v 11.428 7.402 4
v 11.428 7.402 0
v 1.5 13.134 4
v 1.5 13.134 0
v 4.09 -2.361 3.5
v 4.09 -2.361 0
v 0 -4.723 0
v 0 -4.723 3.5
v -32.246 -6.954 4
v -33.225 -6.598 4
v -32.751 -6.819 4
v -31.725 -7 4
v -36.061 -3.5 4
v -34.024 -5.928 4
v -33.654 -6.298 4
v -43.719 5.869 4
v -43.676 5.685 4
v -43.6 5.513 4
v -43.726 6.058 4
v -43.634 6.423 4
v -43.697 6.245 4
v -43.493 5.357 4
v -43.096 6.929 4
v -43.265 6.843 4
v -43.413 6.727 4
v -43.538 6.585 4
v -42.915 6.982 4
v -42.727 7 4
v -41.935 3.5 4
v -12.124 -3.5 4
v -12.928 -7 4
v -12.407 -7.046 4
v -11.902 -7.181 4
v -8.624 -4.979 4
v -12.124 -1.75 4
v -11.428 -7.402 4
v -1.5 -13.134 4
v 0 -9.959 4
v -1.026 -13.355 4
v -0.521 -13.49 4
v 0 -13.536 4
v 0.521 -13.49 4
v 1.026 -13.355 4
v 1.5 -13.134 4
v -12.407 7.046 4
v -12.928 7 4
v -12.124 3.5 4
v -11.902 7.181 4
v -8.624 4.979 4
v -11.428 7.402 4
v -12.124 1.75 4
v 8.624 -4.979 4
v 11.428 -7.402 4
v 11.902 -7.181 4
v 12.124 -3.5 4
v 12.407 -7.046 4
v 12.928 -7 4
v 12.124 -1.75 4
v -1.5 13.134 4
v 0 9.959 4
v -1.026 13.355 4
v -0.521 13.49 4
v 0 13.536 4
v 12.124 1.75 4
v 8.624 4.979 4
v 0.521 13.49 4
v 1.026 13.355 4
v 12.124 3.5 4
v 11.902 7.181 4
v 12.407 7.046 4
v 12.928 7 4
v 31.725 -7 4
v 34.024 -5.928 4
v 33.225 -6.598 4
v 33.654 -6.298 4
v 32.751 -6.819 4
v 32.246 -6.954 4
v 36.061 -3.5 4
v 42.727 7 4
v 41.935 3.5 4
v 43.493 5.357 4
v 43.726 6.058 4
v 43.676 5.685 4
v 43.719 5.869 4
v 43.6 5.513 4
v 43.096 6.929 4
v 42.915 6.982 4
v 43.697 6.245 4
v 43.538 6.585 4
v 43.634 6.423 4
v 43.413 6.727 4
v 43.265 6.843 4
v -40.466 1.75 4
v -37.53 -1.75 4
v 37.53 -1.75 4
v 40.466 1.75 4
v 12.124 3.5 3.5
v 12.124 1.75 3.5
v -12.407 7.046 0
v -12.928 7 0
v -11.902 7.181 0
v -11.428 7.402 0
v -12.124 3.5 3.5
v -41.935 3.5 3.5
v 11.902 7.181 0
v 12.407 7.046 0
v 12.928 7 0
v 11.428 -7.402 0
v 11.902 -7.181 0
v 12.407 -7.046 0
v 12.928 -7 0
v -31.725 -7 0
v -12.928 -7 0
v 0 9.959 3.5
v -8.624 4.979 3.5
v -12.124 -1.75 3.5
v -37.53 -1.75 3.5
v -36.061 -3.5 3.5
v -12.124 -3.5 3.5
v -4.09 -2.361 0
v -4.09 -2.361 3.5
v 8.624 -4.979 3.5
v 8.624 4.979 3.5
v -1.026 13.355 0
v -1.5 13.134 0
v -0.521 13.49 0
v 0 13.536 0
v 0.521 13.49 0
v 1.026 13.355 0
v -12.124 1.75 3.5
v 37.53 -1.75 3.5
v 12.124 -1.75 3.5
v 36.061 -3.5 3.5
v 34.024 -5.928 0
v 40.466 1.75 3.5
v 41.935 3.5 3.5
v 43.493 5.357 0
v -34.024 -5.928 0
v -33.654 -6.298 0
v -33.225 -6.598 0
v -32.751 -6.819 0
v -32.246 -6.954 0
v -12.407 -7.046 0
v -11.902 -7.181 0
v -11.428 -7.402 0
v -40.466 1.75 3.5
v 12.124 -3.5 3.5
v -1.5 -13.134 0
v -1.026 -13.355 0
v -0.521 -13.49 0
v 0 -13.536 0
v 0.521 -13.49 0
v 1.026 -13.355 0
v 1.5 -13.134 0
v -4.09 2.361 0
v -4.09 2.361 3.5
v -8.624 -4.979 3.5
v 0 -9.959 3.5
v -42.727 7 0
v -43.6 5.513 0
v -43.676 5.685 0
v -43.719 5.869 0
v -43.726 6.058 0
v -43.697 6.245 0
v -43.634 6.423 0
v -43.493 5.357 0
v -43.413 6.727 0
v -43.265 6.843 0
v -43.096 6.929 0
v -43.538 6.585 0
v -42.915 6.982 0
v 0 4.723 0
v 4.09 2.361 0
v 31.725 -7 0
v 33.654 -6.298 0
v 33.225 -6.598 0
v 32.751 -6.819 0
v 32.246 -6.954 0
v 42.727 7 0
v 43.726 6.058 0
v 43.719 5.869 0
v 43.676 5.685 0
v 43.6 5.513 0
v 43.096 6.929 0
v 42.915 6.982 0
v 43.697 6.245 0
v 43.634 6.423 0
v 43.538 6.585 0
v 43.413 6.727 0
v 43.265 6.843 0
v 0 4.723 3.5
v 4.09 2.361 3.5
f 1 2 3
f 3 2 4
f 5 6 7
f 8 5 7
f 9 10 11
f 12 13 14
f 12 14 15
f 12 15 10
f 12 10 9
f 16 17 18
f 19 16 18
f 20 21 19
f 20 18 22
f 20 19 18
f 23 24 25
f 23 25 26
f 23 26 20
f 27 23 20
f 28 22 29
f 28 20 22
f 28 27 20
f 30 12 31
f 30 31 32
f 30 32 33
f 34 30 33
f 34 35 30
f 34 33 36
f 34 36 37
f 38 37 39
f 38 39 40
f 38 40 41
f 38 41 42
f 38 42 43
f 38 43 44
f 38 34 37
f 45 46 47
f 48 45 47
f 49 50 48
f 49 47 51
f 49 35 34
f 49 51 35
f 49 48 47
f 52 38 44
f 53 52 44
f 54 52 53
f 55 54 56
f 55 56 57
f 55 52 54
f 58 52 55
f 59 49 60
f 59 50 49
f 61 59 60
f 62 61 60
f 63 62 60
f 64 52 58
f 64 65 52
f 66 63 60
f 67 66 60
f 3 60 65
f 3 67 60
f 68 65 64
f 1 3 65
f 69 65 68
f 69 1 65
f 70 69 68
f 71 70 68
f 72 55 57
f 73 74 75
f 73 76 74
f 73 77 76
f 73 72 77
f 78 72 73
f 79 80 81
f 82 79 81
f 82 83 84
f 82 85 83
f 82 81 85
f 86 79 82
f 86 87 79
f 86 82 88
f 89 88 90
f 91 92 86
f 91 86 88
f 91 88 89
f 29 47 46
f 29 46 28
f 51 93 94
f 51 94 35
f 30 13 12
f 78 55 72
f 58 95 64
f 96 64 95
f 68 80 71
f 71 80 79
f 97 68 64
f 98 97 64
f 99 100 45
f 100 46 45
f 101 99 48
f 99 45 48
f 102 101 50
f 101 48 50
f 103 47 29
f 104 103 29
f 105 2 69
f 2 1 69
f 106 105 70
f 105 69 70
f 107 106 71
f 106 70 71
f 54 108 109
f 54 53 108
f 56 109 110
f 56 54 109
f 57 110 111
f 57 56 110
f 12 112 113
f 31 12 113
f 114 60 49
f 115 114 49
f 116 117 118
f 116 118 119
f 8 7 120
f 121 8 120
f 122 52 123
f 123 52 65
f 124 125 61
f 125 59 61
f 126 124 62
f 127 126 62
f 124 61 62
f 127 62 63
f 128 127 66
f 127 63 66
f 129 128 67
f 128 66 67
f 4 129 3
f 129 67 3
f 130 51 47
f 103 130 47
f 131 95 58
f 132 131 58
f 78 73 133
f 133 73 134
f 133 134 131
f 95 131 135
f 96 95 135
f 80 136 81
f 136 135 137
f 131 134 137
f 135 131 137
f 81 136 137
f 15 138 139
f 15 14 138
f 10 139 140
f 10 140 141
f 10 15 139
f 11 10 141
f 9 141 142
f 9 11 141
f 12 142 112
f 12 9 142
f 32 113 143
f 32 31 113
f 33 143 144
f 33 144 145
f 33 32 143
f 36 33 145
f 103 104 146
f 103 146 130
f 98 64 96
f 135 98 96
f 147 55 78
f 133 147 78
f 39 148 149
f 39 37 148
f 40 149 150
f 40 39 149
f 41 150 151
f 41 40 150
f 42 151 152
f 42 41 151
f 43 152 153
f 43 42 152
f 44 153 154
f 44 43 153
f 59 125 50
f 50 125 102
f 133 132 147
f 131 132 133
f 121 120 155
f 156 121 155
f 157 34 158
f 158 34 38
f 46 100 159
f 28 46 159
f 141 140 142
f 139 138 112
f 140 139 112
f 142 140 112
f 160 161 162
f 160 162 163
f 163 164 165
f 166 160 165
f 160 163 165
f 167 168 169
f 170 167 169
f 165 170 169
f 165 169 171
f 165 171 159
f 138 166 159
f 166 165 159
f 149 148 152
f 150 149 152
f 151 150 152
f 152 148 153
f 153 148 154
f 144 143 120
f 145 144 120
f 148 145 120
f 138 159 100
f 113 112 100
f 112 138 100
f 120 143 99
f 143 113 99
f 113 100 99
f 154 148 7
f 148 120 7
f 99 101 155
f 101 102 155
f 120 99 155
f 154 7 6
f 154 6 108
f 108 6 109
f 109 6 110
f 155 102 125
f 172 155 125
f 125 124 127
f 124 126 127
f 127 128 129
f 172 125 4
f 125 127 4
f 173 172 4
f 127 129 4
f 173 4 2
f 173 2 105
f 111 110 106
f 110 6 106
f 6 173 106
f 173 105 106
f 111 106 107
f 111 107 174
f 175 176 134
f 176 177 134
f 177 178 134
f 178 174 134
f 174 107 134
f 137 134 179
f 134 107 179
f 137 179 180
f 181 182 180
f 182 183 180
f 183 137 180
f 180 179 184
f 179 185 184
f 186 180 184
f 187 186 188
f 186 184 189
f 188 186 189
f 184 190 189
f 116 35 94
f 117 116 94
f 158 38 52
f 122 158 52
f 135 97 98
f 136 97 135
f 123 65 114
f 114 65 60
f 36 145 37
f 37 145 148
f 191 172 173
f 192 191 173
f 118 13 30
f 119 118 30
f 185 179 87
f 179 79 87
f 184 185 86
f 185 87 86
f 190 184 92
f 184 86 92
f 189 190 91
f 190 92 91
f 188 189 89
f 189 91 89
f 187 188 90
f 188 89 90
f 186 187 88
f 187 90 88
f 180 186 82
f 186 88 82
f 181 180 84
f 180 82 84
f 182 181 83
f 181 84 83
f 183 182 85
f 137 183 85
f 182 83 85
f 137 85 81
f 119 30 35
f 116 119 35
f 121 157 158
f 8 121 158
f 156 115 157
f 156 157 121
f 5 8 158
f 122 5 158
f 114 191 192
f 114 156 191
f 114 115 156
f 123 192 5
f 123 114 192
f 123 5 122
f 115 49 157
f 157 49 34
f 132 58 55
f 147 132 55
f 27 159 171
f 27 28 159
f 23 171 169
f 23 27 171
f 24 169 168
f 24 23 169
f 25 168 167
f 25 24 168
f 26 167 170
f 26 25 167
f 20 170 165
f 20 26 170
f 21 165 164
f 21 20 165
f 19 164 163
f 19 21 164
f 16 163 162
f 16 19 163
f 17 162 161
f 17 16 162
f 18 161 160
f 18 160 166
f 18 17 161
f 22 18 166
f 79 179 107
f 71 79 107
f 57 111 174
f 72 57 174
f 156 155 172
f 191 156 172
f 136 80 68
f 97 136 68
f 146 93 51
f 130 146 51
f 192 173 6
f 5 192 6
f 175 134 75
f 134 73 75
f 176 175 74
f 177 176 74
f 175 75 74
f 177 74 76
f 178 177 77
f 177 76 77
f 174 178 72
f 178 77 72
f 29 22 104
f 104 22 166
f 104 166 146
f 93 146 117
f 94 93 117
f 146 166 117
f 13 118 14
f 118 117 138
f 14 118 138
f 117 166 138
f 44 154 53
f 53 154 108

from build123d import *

# Parameters (mm, degrees)
F1_DEPTH = 4
F2_R     = 1
F3_R     = 3
F5_DEPTH = 0.5


with BuildPart() as f1:
    # F0 (on Top) → F1 (new body)
    with BuildSketch(Plane.XY):
        Polygon((-12.124355653, 7), (-30.1414284285, 7), (-44.8717504895, 7), (-33.124355653, -7), (-12.124355653, -7), (0, -14), (12.124355653, -7), (33.124355653, -7), (44.8717504895, 7), (30.1414284285, 7), (12.124355653, 7), (0, 14), align=None)
        Polygon((4.09, 2.361362601), (4.09, -2.361362601), (0, -4.722725202), (-4.09, -2.361362601), (-4.09, 2.361362601), (0, 4.722725202), align=None, mode=Mode.SUBTRACT)
    extrude(amount=F1_DEPTH)

    # F2
    f2_edges = [f1.edges().sort_by_distance(p)[0] for p in [
        (-44.87175, 7, 2),
        (44.87175, 7, 2),
    ]]
    fillet(f2_edges, radius=F2_R)

    # F3
    f3_edges = [f1.edges().sort_by_distance(p)[0] for p in [
        (-33.124356, -7, 2),
        (-12.124356, -7, 2),
        (12.124356, -7, 2),
        (12.124356, 7, 2),
        (-12.124356, 7, 2),
        (0, -14, 2),
        (0, 14, 2),
        (33.124356, -7, 2),
    ]]
    fillet(f3_edges, radius=F3_R)

    # F4 (on face) → F5 (cut)
    with BuildSketch(Plane.XY.offset(4)):
        Polygon((0, -9.9585481157), (8.624355653, -4.9792740578), (8.624355653, 4.9792740578), (0, 9.9585481157), (-8.624355653, 4.9792740578), (-8.624355653, -4.9792740578), align=None)
        Polygon((4.09, 2.361362601), (4.09, -2.361362601), (0, -4.722725202), (-4.09, -2.361362601), (-4.09, 2.361362601), (0, 4.722725202), align=None, mode=Mode.SUBTRACT)
        Polygon((-12.124355653, 3.5), (-41.9349017803, 3.5), (-40.4664774258, 1.75), (-12.124355653, 1.75), align=None)
        Polygon((-12.124355653, -1.75), (-37.5296287167, -1.75), (-36.0612043621, -3.5), (-12.124355653, -3.5), align=None)
        Polygon((12.124355653, 3.5), (12.124355653, 1.75), (40.4664774258, 1.75), (41.9349017803, 3.5), align=None)
        Polygon((36.0612043621, -3.5), (37.5296287167, -1.75), (12.124355653, -1.75), (12.124355653, -3.5), align=None)
    extrude(amount=-F5_DEPTH, mode=Mode.SUBTRACT)


solid = f1.part
